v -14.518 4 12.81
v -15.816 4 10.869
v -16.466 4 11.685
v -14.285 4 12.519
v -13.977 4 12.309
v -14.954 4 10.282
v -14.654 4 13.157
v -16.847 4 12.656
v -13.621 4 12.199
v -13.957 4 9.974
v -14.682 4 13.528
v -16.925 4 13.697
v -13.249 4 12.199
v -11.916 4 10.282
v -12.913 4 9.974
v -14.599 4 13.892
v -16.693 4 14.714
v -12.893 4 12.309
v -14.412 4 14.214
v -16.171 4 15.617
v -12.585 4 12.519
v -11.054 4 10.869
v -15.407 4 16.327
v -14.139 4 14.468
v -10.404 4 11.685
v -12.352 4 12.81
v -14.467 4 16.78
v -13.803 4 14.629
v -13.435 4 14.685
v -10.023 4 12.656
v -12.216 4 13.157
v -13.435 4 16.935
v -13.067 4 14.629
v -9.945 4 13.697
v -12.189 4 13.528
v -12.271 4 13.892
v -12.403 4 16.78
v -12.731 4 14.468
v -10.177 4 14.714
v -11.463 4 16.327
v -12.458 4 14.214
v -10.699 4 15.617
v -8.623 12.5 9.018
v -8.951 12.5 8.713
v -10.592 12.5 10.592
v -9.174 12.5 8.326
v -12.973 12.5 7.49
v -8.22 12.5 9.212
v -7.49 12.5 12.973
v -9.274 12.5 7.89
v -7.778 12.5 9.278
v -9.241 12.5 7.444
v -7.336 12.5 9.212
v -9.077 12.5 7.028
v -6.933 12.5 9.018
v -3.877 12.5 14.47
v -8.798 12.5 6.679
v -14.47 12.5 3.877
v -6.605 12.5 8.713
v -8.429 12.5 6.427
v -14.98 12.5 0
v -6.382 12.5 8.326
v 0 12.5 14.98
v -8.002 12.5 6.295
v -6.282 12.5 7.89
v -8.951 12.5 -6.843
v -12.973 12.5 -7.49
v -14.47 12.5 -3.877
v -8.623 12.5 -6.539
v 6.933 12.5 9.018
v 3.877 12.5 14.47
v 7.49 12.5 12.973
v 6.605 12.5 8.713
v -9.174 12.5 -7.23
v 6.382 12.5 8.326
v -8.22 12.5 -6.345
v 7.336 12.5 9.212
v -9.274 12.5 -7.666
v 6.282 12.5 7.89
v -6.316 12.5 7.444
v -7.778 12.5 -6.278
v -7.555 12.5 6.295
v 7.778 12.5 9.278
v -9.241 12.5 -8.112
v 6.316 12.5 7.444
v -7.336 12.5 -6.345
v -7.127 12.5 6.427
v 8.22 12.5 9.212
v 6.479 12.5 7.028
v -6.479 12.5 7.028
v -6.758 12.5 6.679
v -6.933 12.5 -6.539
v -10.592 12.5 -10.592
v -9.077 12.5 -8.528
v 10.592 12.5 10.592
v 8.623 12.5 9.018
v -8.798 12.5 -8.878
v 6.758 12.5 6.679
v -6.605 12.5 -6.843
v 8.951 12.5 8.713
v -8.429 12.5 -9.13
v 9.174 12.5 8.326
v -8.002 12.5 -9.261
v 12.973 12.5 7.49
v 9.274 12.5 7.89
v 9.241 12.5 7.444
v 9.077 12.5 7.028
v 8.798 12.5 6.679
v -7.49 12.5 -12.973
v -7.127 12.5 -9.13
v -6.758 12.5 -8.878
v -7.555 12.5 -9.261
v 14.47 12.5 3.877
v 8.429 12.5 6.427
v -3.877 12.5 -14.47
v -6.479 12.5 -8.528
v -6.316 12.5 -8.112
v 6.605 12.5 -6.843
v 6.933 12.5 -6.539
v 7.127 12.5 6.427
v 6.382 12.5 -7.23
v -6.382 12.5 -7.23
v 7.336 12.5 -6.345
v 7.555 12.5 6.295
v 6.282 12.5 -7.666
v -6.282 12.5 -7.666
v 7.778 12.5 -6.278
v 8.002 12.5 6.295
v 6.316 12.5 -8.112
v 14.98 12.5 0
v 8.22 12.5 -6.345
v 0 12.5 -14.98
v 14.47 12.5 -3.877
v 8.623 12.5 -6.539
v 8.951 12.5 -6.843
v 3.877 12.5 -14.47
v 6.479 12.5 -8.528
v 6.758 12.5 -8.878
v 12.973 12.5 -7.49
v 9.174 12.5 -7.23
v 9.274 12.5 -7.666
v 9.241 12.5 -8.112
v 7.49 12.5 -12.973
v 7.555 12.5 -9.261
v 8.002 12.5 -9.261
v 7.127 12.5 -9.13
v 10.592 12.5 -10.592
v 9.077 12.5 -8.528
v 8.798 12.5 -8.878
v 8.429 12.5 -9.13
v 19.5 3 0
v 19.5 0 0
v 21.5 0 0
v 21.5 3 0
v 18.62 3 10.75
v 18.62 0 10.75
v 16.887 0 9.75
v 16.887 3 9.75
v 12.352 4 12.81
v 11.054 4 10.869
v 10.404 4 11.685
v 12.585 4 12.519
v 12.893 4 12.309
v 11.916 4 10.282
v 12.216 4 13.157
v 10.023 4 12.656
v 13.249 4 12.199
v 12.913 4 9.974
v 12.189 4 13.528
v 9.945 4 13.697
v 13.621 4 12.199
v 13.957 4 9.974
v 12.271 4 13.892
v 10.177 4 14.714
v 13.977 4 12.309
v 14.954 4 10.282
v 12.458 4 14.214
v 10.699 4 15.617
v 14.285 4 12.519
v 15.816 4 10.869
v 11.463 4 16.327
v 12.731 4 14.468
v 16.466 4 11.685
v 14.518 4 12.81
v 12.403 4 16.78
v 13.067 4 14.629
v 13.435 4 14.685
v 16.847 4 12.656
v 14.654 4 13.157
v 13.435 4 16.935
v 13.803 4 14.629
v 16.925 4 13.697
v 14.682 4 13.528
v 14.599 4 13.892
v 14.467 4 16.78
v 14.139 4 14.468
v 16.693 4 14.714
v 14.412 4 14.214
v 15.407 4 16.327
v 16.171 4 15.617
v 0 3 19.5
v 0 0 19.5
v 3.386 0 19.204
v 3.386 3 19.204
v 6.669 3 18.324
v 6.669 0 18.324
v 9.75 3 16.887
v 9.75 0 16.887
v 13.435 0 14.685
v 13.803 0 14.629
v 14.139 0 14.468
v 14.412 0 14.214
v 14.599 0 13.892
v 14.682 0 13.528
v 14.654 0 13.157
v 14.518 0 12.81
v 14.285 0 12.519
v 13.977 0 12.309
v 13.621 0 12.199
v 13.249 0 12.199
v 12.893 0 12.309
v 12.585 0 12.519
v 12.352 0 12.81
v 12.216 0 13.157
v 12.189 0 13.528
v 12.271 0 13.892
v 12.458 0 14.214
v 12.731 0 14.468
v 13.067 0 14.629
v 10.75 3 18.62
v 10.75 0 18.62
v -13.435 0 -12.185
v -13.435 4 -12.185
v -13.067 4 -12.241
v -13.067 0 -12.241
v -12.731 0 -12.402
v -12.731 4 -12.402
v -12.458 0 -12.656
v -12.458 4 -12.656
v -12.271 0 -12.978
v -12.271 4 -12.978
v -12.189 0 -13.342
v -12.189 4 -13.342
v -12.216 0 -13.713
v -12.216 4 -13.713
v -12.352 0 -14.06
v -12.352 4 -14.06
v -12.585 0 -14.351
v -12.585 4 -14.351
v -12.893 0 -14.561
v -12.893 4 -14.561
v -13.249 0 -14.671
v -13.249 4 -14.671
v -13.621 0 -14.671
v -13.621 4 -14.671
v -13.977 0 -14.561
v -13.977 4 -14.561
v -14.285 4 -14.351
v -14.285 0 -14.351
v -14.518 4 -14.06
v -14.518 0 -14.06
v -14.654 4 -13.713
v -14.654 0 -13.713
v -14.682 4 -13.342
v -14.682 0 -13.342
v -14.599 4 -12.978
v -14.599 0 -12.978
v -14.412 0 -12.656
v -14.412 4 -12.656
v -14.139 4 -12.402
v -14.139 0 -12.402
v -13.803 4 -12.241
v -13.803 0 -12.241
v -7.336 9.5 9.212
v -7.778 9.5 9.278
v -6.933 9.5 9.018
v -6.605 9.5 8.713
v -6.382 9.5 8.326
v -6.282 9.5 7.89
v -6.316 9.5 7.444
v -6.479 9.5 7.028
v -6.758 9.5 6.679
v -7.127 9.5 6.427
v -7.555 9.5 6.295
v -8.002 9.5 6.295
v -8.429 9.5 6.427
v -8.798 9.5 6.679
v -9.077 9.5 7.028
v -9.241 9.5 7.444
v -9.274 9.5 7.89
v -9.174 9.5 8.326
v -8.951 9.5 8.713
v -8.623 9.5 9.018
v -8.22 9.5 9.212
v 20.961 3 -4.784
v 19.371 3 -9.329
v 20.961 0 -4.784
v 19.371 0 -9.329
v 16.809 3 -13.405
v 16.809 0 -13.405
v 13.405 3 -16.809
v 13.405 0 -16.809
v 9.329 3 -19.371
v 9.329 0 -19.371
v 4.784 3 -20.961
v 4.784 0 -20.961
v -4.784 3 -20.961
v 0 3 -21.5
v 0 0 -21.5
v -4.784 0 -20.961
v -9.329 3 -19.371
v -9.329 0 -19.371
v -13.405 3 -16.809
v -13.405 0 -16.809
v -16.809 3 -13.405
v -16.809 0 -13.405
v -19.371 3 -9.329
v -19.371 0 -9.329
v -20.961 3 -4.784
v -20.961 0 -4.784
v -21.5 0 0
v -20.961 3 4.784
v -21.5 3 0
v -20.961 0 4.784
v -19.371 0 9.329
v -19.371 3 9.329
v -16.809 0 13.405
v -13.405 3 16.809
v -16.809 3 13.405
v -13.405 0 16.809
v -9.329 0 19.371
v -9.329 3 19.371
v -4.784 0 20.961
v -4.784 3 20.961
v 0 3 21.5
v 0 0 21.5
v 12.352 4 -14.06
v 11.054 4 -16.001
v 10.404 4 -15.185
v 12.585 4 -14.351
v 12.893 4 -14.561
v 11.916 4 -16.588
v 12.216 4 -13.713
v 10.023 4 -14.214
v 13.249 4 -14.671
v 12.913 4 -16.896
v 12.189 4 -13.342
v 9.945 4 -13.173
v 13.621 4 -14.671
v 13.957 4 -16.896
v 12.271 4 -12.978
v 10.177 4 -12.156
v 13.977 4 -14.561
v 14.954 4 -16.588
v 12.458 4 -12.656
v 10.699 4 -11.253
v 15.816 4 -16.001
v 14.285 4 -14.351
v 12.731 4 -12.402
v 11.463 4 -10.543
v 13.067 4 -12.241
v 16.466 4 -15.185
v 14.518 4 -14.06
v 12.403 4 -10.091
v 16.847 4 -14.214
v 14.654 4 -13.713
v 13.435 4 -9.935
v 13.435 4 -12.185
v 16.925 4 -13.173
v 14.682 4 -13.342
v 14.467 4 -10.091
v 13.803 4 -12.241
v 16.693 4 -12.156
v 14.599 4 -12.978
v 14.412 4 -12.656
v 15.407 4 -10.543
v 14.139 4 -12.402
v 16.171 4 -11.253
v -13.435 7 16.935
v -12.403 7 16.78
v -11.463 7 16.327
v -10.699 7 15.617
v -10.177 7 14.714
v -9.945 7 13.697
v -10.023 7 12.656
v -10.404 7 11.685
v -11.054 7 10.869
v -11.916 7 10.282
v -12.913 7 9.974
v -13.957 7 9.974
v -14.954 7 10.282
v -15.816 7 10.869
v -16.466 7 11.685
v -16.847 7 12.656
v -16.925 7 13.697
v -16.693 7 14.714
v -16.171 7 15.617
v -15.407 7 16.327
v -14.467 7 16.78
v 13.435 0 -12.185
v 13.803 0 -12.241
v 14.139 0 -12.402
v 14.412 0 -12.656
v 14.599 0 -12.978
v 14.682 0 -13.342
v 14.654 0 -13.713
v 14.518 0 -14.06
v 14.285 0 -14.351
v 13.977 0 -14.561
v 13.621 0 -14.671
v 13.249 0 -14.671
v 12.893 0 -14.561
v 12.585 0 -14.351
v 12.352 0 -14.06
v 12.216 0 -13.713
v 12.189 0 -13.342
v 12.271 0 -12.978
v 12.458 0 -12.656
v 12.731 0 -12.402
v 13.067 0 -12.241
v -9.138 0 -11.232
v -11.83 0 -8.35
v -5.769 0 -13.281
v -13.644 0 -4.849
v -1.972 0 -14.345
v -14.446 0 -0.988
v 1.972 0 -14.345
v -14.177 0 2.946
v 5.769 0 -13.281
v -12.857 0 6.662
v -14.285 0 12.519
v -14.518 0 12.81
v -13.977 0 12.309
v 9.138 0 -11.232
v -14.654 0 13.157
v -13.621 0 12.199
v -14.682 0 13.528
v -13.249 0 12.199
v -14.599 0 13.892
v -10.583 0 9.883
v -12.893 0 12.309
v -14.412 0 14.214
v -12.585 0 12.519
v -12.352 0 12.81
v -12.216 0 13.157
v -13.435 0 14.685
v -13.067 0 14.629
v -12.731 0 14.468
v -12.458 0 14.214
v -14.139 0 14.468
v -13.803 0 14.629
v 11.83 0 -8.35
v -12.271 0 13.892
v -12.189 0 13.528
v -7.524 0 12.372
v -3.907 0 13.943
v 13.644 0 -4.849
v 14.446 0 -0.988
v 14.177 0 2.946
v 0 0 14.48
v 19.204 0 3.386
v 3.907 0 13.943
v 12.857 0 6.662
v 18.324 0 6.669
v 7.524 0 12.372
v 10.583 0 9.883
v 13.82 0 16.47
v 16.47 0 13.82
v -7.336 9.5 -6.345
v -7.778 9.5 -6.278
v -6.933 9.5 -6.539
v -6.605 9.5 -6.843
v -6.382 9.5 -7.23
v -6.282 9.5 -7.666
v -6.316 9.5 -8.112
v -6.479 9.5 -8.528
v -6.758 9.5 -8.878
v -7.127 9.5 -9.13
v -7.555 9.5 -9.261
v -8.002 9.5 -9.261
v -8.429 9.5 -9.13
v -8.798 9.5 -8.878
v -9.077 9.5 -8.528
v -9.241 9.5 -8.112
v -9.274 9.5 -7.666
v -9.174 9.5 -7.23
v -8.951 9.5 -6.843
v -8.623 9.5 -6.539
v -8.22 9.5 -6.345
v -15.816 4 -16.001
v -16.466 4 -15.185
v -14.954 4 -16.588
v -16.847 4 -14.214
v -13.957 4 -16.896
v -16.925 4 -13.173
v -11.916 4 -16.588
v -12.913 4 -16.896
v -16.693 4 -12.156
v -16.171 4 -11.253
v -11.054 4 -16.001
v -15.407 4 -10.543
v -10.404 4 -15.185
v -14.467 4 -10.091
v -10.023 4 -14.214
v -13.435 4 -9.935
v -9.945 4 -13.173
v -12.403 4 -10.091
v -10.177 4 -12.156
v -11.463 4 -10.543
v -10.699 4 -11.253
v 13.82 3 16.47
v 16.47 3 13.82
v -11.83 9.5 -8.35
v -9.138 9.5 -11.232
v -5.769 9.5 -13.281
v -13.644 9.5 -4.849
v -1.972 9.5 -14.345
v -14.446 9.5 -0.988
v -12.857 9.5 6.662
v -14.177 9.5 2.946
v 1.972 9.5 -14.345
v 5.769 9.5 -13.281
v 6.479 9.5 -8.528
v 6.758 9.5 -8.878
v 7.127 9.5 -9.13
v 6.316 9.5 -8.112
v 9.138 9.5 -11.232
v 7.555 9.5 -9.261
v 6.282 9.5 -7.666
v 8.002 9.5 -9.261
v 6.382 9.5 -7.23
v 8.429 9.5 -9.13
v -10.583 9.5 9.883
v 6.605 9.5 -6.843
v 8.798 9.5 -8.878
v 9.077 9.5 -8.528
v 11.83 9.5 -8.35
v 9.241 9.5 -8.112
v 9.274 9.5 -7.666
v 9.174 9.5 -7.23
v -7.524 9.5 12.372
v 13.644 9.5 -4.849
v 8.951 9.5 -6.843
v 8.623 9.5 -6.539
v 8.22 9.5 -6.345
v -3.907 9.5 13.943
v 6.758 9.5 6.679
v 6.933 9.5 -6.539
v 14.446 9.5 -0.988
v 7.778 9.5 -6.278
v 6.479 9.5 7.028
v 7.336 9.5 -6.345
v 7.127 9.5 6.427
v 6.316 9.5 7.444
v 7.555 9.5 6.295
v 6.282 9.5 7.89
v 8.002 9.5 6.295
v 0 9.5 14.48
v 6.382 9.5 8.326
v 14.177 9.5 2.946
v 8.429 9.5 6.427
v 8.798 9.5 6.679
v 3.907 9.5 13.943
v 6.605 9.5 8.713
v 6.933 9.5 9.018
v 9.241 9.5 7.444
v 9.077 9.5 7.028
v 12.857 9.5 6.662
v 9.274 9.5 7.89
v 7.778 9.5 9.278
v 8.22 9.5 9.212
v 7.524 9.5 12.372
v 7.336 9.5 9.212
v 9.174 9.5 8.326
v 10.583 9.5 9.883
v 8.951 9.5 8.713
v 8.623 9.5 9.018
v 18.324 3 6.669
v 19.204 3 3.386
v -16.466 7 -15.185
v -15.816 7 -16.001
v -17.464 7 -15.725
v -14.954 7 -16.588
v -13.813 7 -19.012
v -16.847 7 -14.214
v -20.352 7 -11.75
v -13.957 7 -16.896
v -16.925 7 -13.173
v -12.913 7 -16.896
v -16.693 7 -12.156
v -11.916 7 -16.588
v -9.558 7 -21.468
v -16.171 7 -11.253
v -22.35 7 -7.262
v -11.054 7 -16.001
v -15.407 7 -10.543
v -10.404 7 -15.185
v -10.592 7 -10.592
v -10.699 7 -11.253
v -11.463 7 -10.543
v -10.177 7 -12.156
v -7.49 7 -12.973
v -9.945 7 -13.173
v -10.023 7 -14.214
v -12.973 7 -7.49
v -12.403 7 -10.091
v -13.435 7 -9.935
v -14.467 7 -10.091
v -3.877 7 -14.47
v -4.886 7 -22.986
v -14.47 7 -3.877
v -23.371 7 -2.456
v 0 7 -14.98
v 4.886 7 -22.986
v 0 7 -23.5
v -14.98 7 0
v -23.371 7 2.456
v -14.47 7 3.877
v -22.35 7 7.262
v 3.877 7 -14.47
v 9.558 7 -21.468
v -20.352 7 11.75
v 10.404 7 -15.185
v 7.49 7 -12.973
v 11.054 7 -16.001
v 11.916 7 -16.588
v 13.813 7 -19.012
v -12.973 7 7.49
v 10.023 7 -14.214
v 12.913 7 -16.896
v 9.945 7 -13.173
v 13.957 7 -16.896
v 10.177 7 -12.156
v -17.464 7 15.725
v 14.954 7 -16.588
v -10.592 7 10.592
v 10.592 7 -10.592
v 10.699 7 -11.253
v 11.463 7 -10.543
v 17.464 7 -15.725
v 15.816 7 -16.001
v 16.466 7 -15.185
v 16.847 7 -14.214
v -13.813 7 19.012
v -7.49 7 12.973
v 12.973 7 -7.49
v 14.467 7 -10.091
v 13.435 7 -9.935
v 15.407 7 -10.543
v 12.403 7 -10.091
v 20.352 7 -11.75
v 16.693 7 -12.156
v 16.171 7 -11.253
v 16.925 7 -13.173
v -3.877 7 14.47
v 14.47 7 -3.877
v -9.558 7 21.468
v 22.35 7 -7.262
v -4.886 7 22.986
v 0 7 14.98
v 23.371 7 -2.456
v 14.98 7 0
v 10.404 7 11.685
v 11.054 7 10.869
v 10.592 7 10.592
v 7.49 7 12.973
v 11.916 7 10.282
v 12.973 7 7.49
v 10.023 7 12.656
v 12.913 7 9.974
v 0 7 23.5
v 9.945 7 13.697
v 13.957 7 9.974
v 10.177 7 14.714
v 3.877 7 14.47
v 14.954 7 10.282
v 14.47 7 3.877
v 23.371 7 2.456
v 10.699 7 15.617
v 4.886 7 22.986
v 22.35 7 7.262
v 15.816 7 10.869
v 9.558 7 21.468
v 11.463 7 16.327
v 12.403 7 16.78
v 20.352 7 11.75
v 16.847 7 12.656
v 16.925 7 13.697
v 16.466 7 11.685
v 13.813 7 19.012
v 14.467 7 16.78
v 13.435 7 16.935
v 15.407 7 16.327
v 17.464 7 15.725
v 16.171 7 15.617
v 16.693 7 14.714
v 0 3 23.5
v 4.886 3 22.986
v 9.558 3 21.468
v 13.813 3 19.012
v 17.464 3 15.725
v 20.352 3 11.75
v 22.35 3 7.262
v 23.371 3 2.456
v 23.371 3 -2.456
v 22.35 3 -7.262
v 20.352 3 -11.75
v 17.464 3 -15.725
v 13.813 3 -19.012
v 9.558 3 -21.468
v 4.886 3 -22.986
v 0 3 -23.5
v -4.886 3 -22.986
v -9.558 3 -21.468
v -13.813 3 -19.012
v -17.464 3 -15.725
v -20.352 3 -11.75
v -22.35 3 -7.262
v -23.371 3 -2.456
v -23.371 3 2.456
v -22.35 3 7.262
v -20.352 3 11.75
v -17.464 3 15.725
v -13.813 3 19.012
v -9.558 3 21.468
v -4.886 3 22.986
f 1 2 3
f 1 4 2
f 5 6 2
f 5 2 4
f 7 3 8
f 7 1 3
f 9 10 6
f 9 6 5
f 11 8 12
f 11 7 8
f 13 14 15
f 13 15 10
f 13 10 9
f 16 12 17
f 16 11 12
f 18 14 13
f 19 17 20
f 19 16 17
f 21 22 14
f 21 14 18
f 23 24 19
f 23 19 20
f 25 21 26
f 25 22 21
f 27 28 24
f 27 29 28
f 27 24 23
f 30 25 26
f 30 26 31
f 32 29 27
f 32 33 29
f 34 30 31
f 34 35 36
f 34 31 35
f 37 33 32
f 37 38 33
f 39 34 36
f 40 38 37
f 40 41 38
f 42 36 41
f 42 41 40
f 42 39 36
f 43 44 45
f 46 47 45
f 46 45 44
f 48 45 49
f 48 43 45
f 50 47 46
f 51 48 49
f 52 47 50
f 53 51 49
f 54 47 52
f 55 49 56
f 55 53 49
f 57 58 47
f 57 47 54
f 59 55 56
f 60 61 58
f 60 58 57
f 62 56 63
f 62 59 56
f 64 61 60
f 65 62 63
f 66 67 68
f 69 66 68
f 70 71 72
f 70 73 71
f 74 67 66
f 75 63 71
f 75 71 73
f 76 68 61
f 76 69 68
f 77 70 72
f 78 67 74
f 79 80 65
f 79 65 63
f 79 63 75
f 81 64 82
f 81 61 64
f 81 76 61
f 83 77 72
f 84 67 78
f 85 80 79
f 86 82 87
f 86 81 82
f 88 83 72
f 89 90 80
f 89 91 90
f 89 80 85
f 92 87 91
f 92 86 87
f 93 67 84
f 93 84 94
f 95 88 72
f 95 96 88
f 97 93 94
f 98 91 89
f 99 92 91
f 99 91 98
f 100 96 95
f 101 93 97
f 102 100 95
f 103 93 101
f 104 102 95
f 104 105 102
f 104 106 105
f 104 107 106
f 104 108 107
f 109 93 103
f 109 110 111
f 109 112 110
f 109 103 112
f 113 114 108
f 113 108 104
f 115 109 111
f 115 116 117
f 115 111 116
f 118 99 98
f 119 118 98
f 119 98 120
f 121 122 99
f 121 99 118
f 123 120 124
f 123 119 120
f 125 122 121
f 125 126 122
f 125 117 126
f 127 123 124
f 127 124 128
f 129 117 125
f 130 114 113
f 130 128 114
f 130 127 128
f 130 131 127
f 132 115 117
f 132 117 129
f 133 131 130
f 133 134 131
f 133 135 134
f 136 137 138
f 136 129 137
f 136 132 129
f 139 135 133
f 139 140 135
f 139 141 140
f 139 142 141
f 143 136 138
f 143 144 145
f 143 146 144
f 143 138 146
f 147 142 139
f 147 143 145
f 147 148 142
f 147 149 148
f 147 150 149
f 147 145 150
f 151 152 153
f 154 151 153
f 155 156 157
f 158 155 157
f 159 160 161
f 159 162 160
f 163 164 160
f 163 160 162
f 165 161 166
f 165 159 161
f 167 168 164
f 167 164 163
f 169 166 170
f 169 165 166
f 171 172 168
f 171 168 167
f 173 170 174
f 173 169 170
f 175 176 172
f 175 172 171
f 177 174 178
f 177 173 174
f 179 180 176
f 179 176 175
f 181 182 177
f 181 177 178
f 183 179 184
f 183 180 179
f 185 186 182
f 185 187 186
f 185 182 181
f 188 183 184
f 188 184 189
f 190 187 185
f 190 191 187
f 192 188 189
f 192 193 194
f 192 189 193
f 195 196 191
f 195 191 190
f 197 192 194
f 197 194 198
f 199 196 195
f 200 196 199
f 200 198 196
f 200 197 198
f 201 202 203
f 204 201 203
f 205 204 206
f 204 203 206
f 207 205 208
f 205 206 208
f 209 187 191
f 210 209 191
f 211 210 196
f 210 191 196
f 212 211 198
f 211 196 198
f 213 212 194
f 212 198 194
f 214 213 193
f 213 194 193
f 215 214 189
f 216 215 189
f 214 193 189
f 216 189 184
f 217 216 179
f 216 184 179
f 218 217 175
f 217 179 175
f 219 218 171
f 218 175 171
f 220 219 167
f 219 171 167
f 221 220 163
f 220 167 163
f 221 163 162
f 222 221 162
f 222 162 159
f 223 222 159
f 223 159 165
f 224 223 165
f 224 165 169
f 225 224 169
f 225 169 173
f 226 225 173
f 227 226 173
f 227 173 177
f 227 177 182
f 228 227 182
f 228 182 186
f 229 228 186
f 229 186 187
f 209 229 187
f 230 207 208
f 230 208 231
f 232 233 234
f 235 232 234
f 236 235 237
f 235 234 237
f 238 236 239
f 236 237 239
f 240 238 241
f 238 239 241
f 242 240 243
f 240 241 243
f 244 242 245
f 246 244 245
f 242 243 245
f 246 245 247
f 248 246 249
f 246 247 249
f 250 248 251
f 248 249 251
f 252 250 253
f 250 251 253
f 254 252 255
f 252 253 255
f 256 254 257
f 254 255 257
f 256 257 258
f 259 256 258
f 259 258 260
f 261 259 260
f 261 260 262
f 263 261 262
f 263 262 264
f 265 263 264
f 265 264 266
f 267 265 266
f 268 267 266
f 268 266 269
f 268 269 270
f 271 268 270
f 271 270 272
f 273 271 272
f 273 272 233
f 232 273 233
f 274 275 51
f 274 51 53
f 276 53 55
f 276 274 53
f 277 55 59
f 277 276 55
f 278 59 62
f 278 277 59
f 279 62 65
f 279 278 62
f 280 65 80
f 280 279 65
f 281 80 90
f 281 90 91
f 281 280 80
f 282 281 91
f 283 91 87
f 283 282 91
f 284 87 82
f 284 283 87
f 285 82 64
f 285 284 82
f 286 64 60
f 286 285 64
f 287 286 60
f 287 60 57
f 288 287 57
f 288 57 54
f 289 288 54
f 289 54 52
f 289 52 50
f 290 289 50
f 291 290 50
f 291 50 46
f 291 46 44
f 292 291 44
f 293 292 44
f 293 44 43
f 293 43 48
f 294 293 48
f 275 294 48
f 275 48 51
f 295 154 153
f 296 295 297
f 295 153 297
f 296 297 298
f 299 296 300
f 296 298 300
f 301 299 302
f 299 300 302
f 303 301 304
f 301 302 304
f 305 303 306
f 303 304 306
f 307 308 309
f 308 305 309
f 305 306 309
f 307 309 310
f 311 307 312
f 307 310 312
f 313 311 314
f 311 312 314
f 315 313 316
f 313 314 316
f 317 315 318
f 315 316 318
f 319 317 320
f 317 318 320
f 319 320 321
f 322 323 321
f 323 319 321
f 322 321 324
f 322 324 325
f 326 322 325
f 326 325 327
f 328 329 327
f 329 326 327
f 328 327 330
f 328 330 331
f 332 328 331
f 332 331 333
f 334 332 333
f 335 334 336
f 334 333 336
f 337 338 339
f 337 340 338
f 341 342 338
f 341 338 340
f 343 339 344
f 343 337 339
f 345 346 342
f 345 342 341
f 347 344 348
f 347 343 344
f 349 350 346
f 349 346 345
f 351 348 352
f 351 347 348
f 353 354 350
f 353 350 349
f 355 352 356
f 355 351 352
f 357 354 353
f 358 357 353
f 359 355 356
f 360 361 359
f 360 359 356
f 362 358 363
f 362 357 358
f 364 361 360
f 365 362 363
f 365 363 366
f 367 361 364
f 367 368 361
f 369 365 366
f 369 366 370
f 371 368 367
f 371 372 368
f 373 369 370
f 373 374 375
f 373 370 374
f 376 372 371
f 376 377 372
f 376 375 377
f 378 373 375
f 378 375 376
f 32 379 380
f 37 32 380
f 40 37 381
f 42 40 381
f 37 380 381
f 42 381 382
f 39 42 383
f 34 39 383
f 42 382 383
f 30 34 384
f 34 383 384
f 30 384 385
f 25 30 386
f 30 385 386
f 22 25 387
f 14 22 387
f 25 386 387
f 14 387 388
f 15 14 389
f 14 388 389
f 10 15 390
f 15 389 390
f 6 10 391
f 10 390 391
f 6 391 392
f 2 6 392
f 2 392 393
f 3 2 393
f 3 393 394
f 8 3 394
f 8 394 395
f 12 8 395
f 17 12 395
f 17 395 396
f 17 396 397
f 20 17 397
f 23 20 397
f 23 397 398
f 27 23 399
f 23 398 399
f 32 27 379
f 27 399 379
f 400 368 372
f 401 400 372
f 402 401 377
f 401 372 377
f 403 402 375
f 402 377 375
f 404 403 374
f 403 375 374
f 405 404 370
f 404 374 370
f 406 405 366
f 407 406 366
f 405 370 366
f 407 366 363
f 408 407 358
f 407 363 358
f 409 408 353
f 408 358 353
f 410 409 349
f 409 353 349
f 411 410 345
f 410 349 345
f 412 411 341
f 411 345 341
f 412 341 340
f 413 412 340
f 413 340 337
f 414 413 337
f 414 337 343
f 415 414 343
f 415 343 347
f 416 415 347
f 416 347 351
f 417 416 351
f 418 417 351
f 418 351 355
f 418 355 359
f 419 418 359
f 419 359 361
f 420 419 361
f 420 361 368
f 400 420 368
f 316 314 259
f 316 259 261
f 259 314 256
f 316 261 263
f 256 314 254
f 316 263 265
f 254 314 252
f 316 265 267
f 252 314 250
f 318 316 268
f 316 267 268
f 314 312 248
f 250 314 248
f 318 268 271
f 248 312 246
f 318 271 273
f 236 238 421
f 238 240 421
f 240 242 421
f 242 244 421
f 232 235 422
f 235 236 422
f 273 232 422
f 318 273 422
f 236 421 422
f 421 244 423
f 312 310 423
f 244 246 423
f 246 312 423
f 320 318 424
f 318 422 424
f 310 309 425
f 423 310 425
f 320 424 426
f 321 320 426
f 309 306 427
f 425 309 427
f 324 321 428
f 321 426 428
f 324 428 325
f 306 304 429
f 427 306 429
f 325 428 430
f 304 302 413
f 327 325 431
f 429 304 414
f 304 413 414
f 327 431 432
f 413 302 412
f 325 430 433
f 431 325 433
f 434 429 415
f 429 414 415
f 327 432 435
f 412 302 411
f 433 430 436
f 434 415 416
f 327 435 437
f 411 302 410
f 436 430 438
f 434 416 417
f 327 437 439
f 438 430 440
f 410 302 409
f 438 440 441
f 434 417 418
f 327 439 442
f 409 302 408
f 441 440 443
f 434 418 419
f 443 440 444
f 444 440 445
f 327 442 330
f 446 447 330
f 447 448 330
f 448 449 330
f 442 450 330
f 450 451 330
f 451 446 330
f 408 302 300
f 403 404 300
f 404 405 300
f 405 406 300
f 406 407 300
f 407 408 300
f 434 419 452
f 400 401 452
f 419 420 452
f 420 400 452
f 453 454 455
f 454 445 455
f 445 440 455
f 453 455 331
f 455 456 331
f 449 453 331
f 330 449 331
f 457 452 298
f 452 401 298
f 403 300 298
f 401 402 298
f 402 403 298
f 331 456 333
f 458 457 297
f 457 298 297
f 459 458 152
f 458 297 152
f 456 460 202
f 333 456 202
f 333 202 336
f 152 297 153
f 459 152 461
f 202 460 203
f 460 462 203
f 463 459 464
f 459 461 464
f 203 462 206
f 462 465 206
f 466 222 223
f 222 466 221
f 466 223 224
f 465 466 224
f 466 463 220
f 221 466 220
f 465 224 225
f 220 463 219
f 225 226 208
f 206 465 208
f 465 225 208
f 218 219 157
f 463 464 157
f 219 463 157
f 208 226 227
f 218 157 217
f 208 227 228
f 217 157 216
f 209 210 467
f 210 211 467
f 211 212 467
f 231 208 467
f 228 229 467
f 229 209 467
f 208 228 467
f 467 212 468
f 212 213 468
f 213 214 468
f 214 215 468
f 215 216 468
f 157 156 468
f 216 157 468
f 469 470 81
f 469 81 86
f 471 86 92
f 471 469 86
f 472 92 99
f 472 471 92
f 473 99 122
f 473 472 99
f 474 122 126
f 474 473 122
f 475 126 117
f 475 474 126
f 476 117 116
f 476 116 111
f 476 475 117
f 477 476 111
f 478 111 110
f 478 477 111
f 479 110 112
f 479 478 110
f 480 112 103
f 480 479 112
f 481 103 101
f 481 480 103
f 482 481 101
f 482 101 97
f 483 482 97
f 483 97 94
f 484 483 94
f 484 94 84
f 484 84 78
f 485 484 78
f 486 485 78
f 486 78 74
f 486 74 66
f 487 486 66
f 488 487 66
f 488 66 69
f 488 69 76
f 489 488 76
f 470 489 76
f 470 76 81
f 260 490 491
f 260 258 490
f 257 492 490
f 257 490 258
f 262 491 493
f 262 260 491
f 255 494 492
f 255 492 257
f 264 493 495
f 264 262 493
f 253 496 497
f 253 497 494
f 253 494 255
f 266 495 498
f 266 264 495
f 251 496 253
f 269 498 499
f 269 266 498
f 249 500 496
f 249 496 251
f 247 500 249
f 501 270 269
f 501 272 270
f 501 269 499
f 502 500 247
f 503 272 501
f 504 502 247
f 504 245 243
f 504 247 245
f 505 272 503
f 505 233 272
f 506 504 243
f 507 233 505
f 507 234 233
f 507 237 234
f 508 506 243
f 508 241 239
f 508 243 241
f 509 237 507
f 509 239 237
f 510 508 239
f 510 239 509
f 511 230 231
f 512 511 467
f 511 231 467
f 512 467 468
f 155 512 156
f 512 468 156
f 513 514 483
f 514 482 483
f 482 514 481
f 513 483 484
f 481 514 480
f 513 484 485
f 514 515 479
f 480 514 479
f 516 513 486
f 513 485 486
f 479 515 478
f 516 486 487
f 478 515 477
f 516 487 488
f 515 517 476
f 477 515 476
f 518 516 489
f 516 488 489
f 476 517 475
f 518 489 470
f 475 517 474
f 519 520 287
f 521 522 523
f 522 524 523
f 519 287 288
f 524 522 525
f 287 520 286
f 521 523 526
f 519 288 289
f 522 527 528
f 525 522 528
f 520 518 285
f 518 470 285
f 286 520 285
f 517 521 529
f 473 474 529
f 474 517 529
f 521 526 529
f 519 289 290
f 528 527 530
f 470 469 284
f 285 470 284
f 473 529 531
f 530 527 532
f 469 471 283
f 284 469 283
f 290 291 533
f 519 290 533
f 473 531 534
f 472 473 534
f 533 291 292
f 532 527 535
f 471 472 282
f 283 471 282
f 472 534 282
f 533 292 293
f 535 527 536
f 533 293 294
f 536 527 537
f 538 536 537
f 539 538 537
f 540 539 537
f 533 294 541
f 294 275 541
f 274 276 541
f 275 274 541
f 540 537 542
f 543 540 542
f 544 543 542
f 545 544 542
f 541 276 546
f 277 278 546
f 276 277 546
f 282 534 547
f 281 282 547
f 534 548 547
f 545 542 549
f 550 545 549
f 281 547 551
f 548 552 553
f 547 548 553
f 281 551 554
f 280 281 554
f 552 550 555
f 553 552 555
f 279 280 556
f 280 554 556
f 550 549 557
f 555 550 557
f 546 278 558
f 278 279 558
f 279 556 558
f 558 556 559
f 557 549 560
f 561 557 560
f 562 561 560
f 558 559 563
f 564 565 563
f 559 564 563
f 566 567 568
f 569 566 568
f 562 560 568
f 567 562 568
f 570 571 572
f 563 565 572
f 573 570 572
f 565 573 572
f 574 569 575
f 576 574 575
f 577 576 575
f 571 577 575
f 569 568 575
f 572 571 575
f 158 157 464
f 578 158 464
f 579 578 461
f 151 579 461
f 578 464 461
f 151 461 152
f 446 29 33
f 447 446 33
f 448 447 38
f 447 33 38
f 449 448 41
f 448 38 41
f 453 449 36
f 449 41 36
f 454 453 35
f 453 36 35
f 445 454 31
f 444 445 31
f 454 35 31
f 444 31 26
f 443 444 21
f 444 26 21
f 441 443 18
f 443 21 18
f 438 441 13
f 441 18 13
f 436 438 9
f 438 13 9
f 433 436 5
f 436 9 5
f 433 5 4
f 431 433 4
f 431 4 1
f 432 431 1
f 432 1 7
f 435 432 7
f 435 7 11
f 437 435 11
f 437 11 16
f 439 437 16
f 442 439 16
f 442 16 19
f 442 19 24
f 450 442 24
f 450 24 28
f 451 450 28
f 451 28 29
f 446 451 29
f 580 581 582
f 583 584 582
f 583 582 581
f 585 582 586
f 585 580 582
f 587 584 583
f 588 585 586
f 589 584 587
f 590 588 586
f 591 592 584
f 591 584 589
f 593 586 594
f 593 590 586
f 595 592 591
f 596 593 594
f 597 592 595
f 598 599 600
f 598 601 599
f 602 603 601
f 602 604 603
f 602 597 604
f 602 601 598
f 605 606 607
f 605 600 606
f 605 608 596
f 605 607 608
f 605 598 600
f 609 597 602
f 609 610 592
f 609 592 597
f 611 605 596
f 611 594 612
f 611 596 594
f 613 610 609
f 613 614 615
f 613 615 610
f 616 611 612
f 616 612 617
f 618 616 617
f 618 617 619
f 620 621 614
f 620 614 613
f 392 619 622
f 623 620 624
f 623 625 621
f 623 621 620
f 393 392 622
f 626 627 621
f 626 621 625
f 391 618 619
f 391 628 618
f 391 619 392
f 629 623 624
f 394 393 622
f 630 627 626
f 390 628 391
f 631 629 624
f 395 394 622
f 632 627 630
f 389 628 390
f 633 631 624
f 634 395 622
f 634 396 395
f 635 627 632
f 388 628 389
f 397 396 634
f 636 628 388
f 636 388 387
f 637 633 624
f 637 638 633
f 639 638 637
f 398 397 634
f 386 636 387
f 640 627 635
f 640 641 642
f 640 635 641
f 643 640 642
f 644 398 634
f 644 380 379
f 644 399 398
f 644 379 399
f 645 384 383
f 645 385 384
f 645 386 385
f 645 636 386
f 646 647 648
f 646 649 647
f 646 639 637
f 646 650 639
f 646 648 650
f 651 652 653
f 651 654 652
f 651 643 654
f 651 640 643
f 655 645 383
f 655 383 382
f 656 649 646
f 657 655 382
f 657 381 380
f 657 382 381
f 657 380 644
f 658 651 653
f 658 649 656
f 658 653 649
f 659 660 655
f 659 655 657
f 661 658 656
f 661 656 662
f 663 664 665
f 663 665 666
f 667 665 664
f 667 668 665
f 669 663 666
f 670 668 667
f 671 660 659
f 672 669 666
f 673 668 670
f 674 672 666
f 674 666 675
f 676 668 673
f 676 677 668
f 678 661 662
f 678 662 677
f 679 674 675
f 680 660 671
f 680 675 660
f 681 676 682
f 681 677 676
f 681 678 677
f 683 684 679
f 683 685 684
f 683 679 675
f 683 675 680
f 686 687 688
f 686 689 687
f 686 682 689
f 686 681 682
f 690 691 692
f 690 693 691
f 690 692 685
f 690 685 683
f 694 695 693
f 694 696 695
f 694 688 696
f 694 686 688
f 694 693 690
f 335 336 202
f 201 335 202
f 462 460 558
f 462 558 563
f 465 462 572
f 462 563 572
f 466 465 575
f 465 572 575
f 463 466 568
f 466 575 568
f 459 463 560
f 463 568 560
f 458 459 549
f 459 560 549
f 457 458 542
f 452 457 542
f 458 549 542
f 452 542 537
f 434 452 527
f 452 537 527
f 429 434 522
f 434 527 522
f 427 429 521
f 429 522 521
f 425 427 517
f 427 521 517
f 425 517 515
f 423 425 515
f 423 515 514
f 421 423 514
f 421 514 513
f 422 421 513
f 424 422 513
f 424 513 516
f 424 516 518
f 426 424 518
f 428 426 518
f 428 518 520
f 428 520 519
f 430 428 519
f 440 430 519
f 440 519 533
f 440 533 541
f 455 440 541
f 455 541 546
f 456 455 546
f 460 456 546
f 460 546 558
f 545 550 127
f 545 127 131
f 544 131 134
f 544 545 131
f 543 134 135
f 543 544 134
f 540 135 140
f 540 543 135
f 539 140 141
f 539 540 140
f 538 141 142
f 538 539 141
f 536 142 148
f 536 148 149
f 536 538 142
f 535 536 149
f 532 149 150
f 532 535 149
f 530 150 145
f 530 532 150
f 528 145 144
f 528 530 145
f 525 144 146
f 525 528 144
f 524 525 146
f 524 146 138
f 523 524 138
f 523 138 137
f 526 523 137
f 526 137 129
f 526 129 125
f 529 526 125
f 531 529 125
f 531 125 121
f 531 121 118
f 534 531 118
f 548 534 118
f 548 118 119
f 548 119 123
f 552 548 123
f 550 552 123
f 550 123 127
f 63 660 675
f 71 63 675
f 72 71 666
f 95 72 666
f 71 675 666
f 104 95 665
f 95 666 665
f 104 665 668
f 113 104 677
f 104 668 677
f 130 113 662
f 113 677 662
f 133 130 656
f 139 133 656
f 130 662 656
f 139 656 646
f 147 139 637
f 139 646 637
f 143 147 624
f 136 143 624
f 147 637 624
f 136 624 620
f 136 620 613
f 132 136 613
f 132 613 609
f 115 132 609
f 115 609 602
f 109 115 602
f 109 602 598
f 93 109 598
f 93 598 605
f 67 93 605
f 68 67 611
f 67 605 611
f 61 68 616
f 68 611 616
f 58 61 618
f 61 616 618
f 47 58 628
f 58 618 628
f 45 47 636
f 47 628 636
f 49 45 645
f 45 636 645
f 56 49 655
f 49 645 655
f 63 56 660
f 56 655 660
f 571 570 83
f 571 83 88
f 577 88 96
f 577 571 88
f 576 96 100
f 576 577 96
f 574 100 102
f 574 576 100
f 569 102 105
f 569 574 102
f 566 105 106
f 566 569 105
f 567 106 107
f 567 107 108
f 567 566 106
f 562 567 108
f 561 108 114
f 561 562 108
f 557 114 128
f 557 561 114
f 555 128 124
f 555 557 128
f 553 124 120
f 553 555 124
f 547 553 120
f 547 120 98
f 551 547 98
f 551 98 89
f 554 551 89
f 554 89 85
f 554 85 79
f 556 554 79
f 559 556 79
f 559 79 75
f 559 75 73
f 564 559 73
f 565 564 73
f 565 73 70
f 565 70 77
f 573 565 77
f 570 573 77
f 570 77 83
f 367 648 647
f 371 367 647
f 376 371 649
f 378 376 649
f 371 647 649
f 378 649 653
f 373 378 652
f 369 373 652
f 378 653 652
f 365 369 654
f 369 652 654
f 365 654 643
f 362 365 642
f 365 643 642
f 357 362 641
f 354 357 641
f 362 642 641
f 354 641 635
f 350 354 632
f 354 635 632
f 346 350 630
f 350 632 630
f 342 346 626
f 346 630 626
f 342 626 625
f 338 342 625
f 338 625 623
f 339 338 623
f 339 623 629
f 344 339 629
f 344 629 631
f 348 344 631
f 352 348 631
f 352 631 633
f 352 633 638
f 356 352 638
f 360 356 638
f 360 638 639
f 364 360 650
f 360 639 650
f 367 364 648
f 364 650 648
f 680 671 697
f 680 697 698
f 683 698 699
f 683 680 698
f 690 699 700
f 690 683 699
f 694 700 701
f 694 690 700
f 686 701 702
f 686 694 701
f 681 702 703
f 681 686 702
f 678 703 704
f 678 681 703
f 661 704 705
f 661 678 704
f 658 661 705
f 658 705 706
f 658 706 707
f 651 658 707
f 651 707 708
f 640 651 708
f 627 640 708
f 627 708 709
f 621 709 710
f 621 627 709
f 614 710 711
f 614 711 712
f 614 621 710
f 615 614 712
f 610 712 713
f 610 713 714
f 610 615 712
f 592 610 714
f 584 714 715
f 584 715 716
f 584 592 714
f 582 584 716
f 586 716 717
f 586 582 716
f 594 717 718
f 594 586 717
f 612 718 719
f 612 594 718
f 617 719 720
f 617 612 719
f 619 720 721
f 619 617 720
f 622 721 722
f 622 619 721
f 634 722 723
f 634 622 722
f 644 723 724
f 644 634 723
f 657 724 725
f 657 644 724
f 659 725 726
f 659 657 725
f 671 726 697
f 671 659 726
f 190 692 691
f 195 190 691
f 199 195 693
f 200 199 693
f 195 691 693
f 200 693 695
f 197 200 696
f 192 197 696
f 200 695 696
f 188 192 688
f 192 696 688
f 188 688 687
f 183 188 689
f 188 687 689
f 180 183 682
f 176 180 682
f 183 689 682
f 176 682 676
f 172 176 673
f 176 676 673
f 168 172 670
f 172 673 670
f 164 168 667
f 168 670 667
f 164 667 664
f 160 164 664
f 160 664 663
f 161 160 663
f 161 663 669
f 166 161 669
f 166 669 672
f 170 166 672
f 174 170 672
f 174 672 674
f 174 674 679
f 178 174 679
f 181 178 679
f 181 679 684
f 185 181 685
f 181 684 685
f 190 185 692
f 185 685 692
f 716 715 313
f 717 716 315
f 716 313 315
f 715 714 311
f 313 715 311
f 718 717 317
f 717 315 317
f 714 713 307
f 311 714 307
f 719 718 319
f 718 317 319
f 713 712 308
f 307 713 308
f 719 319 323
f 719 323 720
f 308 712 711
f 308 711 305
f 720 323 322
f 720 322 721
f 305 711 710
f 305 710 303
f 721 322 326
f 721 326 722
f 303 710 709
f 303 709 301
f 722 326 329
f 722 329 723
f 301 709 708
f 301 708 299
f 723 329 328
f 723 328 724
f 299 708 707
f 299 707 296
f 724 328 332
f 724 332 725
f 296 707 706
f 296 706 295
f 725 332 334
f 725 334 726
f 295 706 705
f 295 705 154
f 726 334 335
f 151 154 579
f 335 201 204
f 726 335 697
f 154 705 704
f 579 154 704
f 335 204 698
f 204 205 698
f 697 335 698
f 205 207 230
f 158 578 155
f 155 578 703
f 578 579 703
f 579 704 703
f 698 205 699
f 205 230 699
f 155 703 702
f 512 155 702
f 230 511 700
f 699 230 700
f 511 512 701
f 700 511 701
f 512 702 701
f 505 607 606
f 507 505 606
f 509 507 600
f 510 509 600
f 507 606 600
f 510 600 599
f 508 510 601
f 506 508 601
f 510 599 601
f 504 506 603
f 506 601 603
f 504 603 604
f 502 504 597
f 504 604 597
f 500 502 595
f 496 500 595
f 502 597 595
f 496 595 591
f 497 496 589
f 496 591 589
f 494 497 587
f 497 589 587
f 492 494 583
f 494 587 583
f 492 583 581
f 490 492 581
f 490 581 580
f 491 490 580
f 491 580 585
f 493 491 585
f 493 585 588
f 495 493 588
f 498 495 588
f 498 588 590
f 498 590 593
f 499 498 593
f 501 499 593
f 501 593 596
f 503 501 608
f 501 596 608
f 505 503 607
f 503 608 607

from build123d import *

# Parameters (mm, degrees)
SKETCH_2_R           = 21.5
EXTRUDE_1_DEPTH      = 7
SKETCH_3_R           = 23.5
EXTRUDE_2_DEPTH      = 4
SKETCH_6_R           = 1.25
SKETCH_6_R_2         = 8
CUT_EXTRUDE_1_DEPTH  = 15
SKETCH_9_R           = 14.98
SKETCH_9_R_2         = 14.02
EXTRUDE_3_DEPTH      = 5.5
SKETCH_7_R           = 3.5
CUT_EXTRUDE_3_DEPTH  = 3
SKETCH_10_R          = 1.25
CUT_EXTRUDE_4_DEPTH  = 22
CUT_EXTRUDE_5_DEPTH  = 3
SKETCH_12_R          = 14.02
SKETCH_12_R_2        = 1.5
EXTRUDE_4_DEPTH      = 5.5
CUT_EXTRUDE_START    = -3
SKETCH_13_R          = 14.48
CUT_EXTRUDE_10_DEPTH = 33.507041555


with BuildPart() as part:
    # 草图2 → 凸台-拉伸1 (new body)
    with BuildSketch(Plane(origin=(0, 0, 0), x_dir=(1, 0, 0), z_dir=(0, 1, 0))):
        with Locations(Location((0, 0, 0), (0, 0, 270))):
            Circle(SKETCH_2_R)
    extrude(amount=EXTRUDE_1_DEPTH)

    # 草图3 → 凸台-拉伸2 (add)
    with BuildSketch(Plane(origin=(0, 7, 0), x_dir=(1, 0, 0), z_dir=(0, 1, 0))):
        with Locations(Location((0, 0, 0), (0, 0, 270))):
            Circle(SKETCH_3_R)
    extrude(amount=-EXTRUDE_2_DEPTH)

    # 草图6 → 切除-拉伸1 (cut)
    with BuildSketch(Plane(origin=(0, 7, 0), x_dir=(1, 0, 0), z_dir=(0, 1, 0))):
        with Locations(Location((13.435028843, 13.435028843, 0), (0, 0, 270))):
            Circle(SKETCH_6_R)
        with Locations(Location((13.435028843, -13.435028843, 0), (0, 0, 270))):
            Circle(SKETCH_6_R)
        with Locations(Location((-13.435028843, -13.435028843, 0), (0, 0, 270))):
            Circle(SKETCH_6_R)
        with Locations(Location((-13.435028843, 13.435028843, 0), (0, 0, 270))):
            Circle(SKETCH_6_R)
        with Locations(Location((0, 0, 0), (0, 0, 270))):
            Circle(SKETCH_6_R_2)
    extrude(amount=-CUT_EXTRUDE_1_DEPTH, mode=Mode.SUBTRACT)

    # 草图9 → 凸台-拉伸3 (add)
    with BuildSketch(Plane(origin=(0, 7, 0), x_dir=(1, 0, 0), z_dir=(0, 1, 0))):
        with Locations(Location((0, 0, 0), (0, 0, 270))):
            Circle(SKETCH_9_R)
        with Locations(Location((0, 0, 0), (0, 0, 270))):
            Circle(SKETCH_9_R_2, mode=Mode.SUBTRACT)
    extrude(amount=EXTRUDE_3_DEPTH)

    # 草图7 → 切除-拉伸3 (cut)
    with BuildSketch(Plane(origin=(0, 7, 0), x_dir=(1, 0, 0), z_dir=(0, 1, 0))):
        with Locations(Location((-13.435028843, 13.435028843, 0), (0, 0, 270))):
            Circle(SKETCH_7_R)
        with Locations(Location((13.435028843, 13.435028843, 0), (0, 0, 270))):
            Circle(SKETCH_7_R)
        with Locations(Location((13.435028843, -13.435028843, 0), (0, 0, 270))):
            Circle(SKETCH_7_R)
        with Locations(Location((-13.435028843, -13.435028843, 0), (0, 0, 270))):
            Circle(SKETCH_7_R)
    extrude(amount=-CUT_EXTRUDE_3_DEPTH, mode=Mode.SUBTRACT)

    # 草图10 → 切除-拉伸4 (cut)
    with BuildSketch(Plane(origin=(0, 7, 0), x_dir=(1, 0, 0), z_dir=(0, 1, 0))):
        with Locations(Location((7.778174593, 7.778174593, 0), (0, 0, 270))):
            Circle(SKETCH_10_R)
        with Locations(Location((7.778174593, -7.778174593, 0), (0, 0, 270))):
            Circle(SKETCH_10_R)
        with Locations(Location((-7.778174593, -7.778174593, 0), (0, 0, 270))):
            Circle(SKETCH_10_R)
        with Locations(Location((-7.778174593, 7.778174593, 0), (0, 0, 270))):
            Circle(SKETCH_10_R)
    extrude(amount=-CUT_EXTRUDE_4_DEPTH, mode=Mode.SUBTRACT)

    # 草图11 → 切除-拉伸5 (cut)
    with BuildSketch(Plane.XZ):
        with BuildLine():
            Line((18.619546181, 10.75), (16.887495374, 9.75))
            ThreePointArc((16.887495374, 9.75), (18.835553613, 5.046971379), (19.5, 0))
            Line((19.5, 0), (21.5, 0))
            ThreePointArc((21.5, 0), (20.767405265, 5.56460947), (18.619546181, 10.75))
        make_face()
        with BuildLine():
            Line((0, 21.5), (0, 19.5))
            ThreePointArc((0, 19.5), (5.046971379, 18.835553613), (9.75, 16.887495374))
            Line((9.75, 16.887495374), (10.75, 18.619546181))
            ThreePointArc((10.75, 18.619546181), (5.56460947, 20.767405265), (0, 21.5))
        make_face()
    extrude(amount=-CUT_EXTRUDE_5_DEPTH, mode=Mode.SUBTRACT)

    # 草图12 → 凸台-拉伸4 (add)
    with BuildSketch(Plane(origin=(0, 7, 0), x_dir=(1, 0, 0), z_dir=(0, 1, 0))):
        Circle(SKETCH_12_R)
        with Locations(Location((7.778174593, 7.778174593, 0), (0, 0, 270))):
            Circle(SKETCH_12_R_2, mode=Mode.SUBTRACT)
        with Locations(Location((7.778174593, -7.778174593, 0), (0, 0, 270))):
            Circle(SKETCH_12_R_2, mode=Mode.SUBTRACT)
        with Locations(Location((-7.778174593, -7.778174593, 0), (0, 0, 270))):
            Circle(SKETCH_12_R_2, mode=Mode.SUBTRACT)
        with Locations(Location((-7.778174593, 7.778174593, 0), (0, 0, 270))):
            Circle(SKETCH_12_R_2, mode=Mode.SUBTRACT)
    extrude(amount=EXTRUDE_4_DEPTH)

    # 草图13 → 切除-拉伸10 (cut, through all)
    with BuildSketch(Plane(origin=(0, 12.5, 0), x_dir=(1, 0, 0), z_dir=(0, 1, 0)).offset(CUT_EXTRUDE_START)):
        with Locations(Location((0, 0, 0), (0, 0, 270))):
            Circle(SKETCH_13_R)
    extrude(amount=-CUT_EXTRUDE_10_DEPTH, mode=Mode.SUBTRACT)


solid = part.part
